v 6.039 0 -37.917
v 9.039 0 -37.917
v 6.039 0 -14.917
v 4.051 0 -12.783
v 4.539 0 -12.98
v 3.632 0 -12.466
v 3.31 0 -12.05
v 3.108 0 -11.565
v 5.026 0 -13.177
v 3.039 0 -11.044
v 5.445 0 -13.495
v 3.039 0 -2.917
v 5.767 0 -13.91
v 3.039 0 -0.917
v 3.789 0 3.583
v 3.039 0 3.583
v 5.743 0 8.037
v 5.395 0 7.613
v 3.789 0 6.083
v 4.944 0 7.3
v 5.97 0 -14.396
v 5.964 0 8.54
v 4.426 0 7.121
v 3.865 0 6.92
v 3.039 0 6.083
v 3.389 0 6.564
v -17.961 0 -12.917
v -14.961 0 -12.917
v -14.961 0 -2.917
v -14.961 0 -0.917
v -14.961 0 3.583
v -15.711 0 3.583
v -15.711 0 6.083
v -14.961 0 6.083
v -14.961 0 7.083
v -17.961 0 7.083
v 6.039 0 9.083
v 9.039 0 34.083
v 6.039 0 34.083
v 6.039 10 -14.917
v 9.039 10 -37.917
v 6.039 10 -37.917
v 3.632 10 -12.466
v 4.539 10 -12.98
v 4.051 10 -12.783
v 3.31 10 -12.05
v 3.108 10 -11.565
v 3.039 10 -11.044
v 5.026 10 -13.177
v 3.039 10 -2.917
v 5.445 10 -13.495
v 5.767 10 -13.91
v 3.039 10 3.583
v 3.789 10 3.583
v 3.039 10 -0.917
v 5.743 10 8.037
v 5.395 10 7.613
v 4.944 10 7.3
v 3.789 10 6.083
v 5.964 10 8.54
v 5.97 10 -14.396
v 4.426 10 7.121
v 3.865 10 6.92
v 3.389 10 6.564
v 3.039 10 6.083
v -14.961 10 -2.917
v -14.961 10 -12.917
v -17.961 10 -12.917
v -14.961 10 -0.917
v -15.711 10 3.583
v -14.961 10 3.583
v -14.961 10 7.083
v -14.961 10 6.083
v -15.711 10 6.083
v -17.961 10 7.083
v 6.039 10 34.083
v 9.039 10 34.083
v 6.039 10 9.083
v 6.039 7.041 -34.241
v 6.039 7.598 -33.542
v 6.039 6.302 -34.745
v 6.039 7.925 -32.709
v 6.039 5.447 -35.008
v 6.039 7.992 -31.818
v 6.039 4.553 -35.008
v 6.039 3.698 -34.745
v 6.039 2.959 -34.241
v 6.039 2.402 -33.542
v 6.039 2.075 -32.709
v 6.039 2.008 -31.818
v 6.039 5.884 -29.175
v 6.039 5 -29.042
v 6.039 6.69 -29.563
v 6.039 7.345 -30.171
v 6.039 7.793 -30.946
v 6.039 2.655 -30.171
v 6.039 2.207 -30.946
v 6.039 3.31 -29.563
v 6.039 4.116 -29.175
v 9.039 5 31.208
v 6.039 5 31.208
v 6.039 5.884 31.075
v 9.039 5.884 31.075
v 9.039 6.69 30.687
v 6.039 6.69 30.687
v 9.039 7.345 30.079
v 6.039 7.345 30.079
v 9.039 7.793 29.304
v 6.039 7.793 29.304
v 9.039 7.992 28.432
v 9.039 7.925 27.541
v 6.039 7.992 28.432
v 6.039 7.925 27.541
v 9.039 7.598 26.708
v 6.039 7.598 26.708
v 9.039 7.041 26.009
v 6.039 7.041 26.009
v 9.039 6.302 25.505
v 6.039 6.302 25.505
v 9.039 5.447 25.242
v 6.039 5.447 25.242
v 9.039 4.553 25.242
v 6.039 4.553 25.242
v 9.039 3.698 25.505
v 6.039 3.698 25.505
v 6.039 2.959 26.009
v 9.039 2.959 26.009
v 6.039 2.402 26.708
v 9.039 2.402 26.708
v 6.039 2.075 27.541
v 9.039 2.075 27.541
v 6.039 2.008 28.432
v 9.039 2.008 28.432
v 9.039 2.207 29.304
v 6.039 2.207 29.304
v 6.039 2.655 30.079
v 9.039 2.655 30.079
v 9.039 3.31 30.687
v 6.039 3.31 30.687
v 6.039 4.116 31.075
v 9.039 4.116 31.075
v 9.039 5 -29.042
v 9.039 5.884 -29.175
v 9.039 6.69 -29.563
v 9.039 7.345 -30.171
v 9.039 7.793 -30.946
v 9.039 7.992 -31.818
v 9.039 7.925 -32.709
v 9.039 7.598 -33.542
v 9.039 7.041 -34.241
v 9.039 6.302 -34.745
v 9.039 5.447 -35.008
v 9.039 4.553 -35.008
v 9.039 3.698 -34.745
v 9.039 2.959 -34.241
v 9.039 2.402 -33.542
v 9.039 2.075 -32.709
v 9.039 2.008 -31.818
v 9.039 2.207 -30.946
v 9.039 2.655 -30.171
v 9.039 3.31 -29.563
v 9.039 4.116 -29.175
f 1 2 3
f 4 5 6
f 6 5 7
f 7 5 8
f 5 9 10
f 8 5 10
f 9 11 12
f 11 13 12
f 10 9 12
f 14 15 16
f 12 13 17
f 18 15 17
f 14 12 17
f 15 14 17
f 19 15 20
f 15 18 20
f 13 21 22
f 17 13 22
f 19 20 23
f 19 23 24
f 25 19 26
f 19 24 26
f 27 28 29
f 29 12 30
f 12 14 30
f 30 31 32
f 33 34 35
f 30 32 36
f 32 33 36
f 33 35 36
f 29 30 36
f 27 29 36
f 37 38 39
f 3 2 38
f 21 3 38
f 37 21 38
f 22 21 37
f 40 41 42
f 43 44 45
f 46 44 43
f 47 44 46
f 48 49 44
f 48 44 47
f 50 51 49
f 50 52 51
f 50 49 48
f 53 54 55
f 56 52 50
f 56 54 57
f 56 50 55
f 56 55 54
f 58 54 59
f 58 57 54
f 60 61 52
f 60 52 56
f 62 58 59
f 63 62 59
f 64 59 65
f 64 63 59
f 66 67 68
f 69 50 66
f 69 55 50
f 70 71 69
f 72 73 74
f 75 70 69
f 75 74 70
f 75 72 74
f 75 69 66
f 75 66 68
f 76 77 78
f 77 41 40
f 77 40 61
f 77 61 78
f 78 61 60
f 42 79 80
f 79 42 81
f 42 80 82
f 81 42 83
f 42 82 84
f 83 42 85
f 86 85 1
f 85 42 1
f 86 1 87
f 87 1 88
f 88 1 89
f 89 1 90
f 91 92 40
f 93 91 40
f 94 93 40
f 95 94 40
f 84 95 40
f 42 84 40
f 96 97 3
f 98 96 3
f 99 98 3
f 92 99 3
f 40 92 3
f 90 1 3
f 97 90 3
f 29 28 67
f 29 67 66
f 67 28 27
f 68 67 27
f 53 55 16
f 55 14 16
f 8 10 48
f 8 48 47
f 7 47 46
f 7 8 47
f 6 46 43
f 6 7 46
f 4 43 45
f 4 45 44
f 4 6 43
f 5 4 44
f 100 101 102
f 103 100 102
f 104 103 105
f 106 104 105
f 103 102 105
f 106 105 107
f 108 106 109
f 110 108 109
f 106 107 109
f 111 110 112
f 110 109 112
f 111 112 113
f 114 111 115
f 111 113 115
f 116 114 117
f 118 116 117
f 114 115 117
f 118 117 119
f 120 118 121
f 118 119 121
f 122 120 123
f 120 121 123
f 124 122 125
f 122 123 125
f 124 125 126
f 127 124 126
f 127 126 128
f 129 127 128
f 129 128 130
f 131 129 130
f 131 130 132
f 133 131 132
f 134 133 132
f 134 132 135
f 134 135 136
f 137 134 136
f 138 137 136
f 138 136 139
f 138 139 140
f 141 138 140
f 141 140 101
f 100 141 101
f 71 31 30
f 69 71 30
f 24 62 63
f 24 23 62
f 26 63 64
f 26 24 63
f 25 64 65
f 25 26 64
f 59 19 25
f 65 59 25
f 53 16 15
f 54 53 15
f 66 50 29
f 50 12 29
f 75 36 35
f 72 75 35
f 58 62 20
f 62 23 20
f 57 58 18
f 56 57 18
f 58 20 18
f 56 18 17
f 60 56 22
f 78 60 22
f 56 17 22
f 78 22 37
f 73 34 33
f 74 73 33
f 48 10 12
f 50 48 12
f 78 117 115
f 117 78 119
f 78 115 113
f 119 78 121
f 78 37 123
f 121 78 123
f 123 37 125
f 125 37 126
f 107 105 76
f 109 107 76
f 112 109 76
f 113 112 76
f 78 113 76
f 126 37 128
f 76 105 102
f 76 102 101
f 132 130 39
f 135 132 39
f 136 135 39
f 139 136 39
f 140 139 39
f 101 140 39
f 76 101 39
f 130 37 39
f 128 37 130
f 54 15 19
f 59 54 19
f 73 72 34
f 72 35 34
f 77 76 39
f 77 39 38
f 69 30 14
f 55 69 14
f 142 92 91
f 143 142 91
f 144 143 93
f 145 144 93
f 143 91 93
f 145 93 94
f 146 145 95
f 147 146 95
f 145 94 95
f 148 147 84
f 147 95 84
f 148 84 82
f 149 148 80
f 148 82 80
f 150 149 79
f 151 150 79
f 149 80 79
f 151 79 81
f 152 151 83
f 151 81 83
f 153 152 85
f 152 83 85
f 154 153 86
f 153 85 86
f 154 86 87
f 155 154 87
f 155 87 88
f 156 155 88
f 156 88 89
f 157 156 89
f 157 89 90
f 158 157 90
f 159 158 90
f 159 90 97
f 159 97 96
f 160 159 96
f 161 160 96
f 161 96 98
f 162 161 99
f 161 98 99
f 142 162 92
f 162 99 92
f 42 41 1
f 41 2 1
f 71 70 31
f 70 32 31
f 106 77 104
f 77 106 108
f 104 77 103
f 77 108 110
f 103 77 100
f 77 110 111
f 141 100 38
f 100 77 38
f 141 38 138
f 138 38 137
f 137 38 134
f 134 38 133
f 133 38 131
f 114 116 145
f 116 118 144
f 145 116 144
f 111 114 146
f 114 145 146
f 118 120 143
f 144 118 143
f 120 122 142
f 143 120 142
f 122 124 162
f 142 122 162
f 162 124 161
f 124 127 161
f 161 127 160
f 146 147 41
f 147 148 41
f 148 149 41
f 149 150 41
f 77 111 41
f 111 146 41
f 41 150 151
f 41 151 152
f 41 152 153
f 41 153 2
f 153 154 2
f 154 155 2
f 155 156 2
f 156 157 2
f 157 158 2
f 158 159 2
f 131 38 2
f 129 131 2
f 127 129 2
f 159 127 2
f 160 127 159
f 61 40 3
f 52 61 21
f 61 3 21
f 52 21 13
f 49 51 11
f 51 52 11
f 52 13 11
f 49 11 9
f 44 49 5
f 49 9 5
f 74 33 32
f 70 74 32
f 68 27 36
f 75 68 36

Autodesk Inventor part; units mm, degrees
ref_plane "YZ Plane" through (0, 0, 0) normal (1, 0, 0) x (0, 1, 0)
ref_plane "XZ Plane" through (0, 0, 0) normal (0, 1, 0) x (-1, 0, 0)
ref_plane "XY Plane" through (0, 0, 0) normal (0, 0, 1) x (1, 0, 0)
sketch "Sketch1" plane through (0, 0, 0) normal (0, 1, 0) x (-1, 0, 0)
  line L0 (-3.0388, 7.0833) -> (-6.0388, 7.0833)
  line L1 (-6.0388, 7.0833) -> (-6.0388, -12.9167)
  line L2 (-6.0388, -12.9167) -> (-3.0388, -12.9167)
  line L3 (-3.0388, -12.9167) -> (-3.0388, -2.9167)
  line L4 (-3.0388, -2.9167) -> (14.9612, -2.9167)
  line L5 (14.9612, -12.9167) -> (17.9612, -12.9167)
  line L6 (17.9612, -12.9167) -> (17.9612, 7.0833)
  line L7 (17.9612, 7.0833) -> (14.9612, 7.0833)
  line L8 (14.9612, 7.0833) -> (14.9612, 6.0833)
  line L9 (14.9612, 6.0833) -> (15.7112, 6.0833)
  line L10 (15.7112, 6.0833) -> (15.7112, 3.5833)
  line L11 (15.7112, 3.5833) -> (14.9612, 3.5833)
  line L12 (14.9612, 3.5833) -> (14.9612, -0.9167)
  line L13 (14.9612, -0.9167) -> (-3.0388, -0.9167)
  line L14 (-3.0388, -0.9167) -> (-3.0388, 3.5833)
  line L15 (-3.7888, 3.5833) -> (-3.7888, 6.0833)
  line L16 (-3.7888, 6.0833) -> (-3.0388, 6.0833)
  line L17 (-3.0388, 3.5833) -> (-3.7888, 3.5833)
  line L18 (-3.0388, 6.0833) -> (-3.0388, 7.0833)
  line L19 (14.9612, -12.9167) -> (14.9612, -2.9167)
  line L20 (-6.0388, 7.0833) -> (-6.0388, 34.0833)
  line L21 (-6.0388, 34.0833) -> (-9.0388, 34.0833)
  line L22 (-9.0388, 34.0833) -> (-9.0388, -37.9167)
  line L23 (-9.0388, -37.9167) -> (-6.0388, -37.9167)
  line L24 (-6.0388, -37.9167) -> (-6.0388, -12.9167)
  point P0 (0, 0)
  point P1 (14.9612, 1.3333)
  dimension "d0" = 2.5
  dimension "d1" = 3
  dimension "d2" = 3
  dimension "d3" = 10
  dimension "d4" = 10
  dimension "d5" = 2
  dimension "d6" = 3
  dimension "d8" = 1
  dimension "d9" = 8
  dimension "d11" = 0.75
  dimension "d12" = 0.75
  dimension "d13" = 3
  dimension "d16" = 18
  dimension "d17" = 3
  dimension "d18" = 72
  dimension "d19" = 35
extrude "Extrusion1" add sketch "Sketch1" along normal blind 10
fillet "Fillet1" radius 2 4 edges at (6.0388, 5, 7.0833) (6.0388, 5, -12.9167) (3.0388, 5, -12.9167) (3.0388, 5, 7.0833)
sketch "Sketch2" plane through (6.0388, 0, 34.0833) normal (-1, 0, 0) x (0, 0, 1)
  circle A0 centre (-5.875, 5) radius 3
  circle A1 centre (-66.125, 5) radius 3
  line L0 (-72, 0) -> (-49, 0) projected
  line L1 (-72, 10) -> (-49, 10) projected
  line L2 (-25, 10) -> (0, 10) projected
  line L3 (0, 0) -> (0, 10) projected
  line L4 (-72, 0) -> (-72, 10) projected
  point P0 (-34.0833, 0)
  dimension "d21" = 6
  dimension "d22" = 6
  dimension "d23" = 10
  dimension "d24" = 5
  dimension "d25" = 5
  dimension "d26" = 60.25
  dimension "d27" = 72
  dimension "d28" = 5.875
extrude "Extrusion2" cut sketch "Sketch2" against normal through all
equation "\"d2\" = d1"
equation "\"d4\" = d3"
equation "\"d6\" = d2"
equation "\"d12\" = d11"
equation "\"d13\" = d1"
equation "\"d19\" = -0.5 * d5 + 0.5 * d18"
equation "\"d24\" = 0.5 * d23"
equation "\"d25\" = 0.5 * d23"
equation "\"d28\" = -0.5 * d26 + 0.5 * d27"
properties part number "CO-1-01-stepperControllerMount"
